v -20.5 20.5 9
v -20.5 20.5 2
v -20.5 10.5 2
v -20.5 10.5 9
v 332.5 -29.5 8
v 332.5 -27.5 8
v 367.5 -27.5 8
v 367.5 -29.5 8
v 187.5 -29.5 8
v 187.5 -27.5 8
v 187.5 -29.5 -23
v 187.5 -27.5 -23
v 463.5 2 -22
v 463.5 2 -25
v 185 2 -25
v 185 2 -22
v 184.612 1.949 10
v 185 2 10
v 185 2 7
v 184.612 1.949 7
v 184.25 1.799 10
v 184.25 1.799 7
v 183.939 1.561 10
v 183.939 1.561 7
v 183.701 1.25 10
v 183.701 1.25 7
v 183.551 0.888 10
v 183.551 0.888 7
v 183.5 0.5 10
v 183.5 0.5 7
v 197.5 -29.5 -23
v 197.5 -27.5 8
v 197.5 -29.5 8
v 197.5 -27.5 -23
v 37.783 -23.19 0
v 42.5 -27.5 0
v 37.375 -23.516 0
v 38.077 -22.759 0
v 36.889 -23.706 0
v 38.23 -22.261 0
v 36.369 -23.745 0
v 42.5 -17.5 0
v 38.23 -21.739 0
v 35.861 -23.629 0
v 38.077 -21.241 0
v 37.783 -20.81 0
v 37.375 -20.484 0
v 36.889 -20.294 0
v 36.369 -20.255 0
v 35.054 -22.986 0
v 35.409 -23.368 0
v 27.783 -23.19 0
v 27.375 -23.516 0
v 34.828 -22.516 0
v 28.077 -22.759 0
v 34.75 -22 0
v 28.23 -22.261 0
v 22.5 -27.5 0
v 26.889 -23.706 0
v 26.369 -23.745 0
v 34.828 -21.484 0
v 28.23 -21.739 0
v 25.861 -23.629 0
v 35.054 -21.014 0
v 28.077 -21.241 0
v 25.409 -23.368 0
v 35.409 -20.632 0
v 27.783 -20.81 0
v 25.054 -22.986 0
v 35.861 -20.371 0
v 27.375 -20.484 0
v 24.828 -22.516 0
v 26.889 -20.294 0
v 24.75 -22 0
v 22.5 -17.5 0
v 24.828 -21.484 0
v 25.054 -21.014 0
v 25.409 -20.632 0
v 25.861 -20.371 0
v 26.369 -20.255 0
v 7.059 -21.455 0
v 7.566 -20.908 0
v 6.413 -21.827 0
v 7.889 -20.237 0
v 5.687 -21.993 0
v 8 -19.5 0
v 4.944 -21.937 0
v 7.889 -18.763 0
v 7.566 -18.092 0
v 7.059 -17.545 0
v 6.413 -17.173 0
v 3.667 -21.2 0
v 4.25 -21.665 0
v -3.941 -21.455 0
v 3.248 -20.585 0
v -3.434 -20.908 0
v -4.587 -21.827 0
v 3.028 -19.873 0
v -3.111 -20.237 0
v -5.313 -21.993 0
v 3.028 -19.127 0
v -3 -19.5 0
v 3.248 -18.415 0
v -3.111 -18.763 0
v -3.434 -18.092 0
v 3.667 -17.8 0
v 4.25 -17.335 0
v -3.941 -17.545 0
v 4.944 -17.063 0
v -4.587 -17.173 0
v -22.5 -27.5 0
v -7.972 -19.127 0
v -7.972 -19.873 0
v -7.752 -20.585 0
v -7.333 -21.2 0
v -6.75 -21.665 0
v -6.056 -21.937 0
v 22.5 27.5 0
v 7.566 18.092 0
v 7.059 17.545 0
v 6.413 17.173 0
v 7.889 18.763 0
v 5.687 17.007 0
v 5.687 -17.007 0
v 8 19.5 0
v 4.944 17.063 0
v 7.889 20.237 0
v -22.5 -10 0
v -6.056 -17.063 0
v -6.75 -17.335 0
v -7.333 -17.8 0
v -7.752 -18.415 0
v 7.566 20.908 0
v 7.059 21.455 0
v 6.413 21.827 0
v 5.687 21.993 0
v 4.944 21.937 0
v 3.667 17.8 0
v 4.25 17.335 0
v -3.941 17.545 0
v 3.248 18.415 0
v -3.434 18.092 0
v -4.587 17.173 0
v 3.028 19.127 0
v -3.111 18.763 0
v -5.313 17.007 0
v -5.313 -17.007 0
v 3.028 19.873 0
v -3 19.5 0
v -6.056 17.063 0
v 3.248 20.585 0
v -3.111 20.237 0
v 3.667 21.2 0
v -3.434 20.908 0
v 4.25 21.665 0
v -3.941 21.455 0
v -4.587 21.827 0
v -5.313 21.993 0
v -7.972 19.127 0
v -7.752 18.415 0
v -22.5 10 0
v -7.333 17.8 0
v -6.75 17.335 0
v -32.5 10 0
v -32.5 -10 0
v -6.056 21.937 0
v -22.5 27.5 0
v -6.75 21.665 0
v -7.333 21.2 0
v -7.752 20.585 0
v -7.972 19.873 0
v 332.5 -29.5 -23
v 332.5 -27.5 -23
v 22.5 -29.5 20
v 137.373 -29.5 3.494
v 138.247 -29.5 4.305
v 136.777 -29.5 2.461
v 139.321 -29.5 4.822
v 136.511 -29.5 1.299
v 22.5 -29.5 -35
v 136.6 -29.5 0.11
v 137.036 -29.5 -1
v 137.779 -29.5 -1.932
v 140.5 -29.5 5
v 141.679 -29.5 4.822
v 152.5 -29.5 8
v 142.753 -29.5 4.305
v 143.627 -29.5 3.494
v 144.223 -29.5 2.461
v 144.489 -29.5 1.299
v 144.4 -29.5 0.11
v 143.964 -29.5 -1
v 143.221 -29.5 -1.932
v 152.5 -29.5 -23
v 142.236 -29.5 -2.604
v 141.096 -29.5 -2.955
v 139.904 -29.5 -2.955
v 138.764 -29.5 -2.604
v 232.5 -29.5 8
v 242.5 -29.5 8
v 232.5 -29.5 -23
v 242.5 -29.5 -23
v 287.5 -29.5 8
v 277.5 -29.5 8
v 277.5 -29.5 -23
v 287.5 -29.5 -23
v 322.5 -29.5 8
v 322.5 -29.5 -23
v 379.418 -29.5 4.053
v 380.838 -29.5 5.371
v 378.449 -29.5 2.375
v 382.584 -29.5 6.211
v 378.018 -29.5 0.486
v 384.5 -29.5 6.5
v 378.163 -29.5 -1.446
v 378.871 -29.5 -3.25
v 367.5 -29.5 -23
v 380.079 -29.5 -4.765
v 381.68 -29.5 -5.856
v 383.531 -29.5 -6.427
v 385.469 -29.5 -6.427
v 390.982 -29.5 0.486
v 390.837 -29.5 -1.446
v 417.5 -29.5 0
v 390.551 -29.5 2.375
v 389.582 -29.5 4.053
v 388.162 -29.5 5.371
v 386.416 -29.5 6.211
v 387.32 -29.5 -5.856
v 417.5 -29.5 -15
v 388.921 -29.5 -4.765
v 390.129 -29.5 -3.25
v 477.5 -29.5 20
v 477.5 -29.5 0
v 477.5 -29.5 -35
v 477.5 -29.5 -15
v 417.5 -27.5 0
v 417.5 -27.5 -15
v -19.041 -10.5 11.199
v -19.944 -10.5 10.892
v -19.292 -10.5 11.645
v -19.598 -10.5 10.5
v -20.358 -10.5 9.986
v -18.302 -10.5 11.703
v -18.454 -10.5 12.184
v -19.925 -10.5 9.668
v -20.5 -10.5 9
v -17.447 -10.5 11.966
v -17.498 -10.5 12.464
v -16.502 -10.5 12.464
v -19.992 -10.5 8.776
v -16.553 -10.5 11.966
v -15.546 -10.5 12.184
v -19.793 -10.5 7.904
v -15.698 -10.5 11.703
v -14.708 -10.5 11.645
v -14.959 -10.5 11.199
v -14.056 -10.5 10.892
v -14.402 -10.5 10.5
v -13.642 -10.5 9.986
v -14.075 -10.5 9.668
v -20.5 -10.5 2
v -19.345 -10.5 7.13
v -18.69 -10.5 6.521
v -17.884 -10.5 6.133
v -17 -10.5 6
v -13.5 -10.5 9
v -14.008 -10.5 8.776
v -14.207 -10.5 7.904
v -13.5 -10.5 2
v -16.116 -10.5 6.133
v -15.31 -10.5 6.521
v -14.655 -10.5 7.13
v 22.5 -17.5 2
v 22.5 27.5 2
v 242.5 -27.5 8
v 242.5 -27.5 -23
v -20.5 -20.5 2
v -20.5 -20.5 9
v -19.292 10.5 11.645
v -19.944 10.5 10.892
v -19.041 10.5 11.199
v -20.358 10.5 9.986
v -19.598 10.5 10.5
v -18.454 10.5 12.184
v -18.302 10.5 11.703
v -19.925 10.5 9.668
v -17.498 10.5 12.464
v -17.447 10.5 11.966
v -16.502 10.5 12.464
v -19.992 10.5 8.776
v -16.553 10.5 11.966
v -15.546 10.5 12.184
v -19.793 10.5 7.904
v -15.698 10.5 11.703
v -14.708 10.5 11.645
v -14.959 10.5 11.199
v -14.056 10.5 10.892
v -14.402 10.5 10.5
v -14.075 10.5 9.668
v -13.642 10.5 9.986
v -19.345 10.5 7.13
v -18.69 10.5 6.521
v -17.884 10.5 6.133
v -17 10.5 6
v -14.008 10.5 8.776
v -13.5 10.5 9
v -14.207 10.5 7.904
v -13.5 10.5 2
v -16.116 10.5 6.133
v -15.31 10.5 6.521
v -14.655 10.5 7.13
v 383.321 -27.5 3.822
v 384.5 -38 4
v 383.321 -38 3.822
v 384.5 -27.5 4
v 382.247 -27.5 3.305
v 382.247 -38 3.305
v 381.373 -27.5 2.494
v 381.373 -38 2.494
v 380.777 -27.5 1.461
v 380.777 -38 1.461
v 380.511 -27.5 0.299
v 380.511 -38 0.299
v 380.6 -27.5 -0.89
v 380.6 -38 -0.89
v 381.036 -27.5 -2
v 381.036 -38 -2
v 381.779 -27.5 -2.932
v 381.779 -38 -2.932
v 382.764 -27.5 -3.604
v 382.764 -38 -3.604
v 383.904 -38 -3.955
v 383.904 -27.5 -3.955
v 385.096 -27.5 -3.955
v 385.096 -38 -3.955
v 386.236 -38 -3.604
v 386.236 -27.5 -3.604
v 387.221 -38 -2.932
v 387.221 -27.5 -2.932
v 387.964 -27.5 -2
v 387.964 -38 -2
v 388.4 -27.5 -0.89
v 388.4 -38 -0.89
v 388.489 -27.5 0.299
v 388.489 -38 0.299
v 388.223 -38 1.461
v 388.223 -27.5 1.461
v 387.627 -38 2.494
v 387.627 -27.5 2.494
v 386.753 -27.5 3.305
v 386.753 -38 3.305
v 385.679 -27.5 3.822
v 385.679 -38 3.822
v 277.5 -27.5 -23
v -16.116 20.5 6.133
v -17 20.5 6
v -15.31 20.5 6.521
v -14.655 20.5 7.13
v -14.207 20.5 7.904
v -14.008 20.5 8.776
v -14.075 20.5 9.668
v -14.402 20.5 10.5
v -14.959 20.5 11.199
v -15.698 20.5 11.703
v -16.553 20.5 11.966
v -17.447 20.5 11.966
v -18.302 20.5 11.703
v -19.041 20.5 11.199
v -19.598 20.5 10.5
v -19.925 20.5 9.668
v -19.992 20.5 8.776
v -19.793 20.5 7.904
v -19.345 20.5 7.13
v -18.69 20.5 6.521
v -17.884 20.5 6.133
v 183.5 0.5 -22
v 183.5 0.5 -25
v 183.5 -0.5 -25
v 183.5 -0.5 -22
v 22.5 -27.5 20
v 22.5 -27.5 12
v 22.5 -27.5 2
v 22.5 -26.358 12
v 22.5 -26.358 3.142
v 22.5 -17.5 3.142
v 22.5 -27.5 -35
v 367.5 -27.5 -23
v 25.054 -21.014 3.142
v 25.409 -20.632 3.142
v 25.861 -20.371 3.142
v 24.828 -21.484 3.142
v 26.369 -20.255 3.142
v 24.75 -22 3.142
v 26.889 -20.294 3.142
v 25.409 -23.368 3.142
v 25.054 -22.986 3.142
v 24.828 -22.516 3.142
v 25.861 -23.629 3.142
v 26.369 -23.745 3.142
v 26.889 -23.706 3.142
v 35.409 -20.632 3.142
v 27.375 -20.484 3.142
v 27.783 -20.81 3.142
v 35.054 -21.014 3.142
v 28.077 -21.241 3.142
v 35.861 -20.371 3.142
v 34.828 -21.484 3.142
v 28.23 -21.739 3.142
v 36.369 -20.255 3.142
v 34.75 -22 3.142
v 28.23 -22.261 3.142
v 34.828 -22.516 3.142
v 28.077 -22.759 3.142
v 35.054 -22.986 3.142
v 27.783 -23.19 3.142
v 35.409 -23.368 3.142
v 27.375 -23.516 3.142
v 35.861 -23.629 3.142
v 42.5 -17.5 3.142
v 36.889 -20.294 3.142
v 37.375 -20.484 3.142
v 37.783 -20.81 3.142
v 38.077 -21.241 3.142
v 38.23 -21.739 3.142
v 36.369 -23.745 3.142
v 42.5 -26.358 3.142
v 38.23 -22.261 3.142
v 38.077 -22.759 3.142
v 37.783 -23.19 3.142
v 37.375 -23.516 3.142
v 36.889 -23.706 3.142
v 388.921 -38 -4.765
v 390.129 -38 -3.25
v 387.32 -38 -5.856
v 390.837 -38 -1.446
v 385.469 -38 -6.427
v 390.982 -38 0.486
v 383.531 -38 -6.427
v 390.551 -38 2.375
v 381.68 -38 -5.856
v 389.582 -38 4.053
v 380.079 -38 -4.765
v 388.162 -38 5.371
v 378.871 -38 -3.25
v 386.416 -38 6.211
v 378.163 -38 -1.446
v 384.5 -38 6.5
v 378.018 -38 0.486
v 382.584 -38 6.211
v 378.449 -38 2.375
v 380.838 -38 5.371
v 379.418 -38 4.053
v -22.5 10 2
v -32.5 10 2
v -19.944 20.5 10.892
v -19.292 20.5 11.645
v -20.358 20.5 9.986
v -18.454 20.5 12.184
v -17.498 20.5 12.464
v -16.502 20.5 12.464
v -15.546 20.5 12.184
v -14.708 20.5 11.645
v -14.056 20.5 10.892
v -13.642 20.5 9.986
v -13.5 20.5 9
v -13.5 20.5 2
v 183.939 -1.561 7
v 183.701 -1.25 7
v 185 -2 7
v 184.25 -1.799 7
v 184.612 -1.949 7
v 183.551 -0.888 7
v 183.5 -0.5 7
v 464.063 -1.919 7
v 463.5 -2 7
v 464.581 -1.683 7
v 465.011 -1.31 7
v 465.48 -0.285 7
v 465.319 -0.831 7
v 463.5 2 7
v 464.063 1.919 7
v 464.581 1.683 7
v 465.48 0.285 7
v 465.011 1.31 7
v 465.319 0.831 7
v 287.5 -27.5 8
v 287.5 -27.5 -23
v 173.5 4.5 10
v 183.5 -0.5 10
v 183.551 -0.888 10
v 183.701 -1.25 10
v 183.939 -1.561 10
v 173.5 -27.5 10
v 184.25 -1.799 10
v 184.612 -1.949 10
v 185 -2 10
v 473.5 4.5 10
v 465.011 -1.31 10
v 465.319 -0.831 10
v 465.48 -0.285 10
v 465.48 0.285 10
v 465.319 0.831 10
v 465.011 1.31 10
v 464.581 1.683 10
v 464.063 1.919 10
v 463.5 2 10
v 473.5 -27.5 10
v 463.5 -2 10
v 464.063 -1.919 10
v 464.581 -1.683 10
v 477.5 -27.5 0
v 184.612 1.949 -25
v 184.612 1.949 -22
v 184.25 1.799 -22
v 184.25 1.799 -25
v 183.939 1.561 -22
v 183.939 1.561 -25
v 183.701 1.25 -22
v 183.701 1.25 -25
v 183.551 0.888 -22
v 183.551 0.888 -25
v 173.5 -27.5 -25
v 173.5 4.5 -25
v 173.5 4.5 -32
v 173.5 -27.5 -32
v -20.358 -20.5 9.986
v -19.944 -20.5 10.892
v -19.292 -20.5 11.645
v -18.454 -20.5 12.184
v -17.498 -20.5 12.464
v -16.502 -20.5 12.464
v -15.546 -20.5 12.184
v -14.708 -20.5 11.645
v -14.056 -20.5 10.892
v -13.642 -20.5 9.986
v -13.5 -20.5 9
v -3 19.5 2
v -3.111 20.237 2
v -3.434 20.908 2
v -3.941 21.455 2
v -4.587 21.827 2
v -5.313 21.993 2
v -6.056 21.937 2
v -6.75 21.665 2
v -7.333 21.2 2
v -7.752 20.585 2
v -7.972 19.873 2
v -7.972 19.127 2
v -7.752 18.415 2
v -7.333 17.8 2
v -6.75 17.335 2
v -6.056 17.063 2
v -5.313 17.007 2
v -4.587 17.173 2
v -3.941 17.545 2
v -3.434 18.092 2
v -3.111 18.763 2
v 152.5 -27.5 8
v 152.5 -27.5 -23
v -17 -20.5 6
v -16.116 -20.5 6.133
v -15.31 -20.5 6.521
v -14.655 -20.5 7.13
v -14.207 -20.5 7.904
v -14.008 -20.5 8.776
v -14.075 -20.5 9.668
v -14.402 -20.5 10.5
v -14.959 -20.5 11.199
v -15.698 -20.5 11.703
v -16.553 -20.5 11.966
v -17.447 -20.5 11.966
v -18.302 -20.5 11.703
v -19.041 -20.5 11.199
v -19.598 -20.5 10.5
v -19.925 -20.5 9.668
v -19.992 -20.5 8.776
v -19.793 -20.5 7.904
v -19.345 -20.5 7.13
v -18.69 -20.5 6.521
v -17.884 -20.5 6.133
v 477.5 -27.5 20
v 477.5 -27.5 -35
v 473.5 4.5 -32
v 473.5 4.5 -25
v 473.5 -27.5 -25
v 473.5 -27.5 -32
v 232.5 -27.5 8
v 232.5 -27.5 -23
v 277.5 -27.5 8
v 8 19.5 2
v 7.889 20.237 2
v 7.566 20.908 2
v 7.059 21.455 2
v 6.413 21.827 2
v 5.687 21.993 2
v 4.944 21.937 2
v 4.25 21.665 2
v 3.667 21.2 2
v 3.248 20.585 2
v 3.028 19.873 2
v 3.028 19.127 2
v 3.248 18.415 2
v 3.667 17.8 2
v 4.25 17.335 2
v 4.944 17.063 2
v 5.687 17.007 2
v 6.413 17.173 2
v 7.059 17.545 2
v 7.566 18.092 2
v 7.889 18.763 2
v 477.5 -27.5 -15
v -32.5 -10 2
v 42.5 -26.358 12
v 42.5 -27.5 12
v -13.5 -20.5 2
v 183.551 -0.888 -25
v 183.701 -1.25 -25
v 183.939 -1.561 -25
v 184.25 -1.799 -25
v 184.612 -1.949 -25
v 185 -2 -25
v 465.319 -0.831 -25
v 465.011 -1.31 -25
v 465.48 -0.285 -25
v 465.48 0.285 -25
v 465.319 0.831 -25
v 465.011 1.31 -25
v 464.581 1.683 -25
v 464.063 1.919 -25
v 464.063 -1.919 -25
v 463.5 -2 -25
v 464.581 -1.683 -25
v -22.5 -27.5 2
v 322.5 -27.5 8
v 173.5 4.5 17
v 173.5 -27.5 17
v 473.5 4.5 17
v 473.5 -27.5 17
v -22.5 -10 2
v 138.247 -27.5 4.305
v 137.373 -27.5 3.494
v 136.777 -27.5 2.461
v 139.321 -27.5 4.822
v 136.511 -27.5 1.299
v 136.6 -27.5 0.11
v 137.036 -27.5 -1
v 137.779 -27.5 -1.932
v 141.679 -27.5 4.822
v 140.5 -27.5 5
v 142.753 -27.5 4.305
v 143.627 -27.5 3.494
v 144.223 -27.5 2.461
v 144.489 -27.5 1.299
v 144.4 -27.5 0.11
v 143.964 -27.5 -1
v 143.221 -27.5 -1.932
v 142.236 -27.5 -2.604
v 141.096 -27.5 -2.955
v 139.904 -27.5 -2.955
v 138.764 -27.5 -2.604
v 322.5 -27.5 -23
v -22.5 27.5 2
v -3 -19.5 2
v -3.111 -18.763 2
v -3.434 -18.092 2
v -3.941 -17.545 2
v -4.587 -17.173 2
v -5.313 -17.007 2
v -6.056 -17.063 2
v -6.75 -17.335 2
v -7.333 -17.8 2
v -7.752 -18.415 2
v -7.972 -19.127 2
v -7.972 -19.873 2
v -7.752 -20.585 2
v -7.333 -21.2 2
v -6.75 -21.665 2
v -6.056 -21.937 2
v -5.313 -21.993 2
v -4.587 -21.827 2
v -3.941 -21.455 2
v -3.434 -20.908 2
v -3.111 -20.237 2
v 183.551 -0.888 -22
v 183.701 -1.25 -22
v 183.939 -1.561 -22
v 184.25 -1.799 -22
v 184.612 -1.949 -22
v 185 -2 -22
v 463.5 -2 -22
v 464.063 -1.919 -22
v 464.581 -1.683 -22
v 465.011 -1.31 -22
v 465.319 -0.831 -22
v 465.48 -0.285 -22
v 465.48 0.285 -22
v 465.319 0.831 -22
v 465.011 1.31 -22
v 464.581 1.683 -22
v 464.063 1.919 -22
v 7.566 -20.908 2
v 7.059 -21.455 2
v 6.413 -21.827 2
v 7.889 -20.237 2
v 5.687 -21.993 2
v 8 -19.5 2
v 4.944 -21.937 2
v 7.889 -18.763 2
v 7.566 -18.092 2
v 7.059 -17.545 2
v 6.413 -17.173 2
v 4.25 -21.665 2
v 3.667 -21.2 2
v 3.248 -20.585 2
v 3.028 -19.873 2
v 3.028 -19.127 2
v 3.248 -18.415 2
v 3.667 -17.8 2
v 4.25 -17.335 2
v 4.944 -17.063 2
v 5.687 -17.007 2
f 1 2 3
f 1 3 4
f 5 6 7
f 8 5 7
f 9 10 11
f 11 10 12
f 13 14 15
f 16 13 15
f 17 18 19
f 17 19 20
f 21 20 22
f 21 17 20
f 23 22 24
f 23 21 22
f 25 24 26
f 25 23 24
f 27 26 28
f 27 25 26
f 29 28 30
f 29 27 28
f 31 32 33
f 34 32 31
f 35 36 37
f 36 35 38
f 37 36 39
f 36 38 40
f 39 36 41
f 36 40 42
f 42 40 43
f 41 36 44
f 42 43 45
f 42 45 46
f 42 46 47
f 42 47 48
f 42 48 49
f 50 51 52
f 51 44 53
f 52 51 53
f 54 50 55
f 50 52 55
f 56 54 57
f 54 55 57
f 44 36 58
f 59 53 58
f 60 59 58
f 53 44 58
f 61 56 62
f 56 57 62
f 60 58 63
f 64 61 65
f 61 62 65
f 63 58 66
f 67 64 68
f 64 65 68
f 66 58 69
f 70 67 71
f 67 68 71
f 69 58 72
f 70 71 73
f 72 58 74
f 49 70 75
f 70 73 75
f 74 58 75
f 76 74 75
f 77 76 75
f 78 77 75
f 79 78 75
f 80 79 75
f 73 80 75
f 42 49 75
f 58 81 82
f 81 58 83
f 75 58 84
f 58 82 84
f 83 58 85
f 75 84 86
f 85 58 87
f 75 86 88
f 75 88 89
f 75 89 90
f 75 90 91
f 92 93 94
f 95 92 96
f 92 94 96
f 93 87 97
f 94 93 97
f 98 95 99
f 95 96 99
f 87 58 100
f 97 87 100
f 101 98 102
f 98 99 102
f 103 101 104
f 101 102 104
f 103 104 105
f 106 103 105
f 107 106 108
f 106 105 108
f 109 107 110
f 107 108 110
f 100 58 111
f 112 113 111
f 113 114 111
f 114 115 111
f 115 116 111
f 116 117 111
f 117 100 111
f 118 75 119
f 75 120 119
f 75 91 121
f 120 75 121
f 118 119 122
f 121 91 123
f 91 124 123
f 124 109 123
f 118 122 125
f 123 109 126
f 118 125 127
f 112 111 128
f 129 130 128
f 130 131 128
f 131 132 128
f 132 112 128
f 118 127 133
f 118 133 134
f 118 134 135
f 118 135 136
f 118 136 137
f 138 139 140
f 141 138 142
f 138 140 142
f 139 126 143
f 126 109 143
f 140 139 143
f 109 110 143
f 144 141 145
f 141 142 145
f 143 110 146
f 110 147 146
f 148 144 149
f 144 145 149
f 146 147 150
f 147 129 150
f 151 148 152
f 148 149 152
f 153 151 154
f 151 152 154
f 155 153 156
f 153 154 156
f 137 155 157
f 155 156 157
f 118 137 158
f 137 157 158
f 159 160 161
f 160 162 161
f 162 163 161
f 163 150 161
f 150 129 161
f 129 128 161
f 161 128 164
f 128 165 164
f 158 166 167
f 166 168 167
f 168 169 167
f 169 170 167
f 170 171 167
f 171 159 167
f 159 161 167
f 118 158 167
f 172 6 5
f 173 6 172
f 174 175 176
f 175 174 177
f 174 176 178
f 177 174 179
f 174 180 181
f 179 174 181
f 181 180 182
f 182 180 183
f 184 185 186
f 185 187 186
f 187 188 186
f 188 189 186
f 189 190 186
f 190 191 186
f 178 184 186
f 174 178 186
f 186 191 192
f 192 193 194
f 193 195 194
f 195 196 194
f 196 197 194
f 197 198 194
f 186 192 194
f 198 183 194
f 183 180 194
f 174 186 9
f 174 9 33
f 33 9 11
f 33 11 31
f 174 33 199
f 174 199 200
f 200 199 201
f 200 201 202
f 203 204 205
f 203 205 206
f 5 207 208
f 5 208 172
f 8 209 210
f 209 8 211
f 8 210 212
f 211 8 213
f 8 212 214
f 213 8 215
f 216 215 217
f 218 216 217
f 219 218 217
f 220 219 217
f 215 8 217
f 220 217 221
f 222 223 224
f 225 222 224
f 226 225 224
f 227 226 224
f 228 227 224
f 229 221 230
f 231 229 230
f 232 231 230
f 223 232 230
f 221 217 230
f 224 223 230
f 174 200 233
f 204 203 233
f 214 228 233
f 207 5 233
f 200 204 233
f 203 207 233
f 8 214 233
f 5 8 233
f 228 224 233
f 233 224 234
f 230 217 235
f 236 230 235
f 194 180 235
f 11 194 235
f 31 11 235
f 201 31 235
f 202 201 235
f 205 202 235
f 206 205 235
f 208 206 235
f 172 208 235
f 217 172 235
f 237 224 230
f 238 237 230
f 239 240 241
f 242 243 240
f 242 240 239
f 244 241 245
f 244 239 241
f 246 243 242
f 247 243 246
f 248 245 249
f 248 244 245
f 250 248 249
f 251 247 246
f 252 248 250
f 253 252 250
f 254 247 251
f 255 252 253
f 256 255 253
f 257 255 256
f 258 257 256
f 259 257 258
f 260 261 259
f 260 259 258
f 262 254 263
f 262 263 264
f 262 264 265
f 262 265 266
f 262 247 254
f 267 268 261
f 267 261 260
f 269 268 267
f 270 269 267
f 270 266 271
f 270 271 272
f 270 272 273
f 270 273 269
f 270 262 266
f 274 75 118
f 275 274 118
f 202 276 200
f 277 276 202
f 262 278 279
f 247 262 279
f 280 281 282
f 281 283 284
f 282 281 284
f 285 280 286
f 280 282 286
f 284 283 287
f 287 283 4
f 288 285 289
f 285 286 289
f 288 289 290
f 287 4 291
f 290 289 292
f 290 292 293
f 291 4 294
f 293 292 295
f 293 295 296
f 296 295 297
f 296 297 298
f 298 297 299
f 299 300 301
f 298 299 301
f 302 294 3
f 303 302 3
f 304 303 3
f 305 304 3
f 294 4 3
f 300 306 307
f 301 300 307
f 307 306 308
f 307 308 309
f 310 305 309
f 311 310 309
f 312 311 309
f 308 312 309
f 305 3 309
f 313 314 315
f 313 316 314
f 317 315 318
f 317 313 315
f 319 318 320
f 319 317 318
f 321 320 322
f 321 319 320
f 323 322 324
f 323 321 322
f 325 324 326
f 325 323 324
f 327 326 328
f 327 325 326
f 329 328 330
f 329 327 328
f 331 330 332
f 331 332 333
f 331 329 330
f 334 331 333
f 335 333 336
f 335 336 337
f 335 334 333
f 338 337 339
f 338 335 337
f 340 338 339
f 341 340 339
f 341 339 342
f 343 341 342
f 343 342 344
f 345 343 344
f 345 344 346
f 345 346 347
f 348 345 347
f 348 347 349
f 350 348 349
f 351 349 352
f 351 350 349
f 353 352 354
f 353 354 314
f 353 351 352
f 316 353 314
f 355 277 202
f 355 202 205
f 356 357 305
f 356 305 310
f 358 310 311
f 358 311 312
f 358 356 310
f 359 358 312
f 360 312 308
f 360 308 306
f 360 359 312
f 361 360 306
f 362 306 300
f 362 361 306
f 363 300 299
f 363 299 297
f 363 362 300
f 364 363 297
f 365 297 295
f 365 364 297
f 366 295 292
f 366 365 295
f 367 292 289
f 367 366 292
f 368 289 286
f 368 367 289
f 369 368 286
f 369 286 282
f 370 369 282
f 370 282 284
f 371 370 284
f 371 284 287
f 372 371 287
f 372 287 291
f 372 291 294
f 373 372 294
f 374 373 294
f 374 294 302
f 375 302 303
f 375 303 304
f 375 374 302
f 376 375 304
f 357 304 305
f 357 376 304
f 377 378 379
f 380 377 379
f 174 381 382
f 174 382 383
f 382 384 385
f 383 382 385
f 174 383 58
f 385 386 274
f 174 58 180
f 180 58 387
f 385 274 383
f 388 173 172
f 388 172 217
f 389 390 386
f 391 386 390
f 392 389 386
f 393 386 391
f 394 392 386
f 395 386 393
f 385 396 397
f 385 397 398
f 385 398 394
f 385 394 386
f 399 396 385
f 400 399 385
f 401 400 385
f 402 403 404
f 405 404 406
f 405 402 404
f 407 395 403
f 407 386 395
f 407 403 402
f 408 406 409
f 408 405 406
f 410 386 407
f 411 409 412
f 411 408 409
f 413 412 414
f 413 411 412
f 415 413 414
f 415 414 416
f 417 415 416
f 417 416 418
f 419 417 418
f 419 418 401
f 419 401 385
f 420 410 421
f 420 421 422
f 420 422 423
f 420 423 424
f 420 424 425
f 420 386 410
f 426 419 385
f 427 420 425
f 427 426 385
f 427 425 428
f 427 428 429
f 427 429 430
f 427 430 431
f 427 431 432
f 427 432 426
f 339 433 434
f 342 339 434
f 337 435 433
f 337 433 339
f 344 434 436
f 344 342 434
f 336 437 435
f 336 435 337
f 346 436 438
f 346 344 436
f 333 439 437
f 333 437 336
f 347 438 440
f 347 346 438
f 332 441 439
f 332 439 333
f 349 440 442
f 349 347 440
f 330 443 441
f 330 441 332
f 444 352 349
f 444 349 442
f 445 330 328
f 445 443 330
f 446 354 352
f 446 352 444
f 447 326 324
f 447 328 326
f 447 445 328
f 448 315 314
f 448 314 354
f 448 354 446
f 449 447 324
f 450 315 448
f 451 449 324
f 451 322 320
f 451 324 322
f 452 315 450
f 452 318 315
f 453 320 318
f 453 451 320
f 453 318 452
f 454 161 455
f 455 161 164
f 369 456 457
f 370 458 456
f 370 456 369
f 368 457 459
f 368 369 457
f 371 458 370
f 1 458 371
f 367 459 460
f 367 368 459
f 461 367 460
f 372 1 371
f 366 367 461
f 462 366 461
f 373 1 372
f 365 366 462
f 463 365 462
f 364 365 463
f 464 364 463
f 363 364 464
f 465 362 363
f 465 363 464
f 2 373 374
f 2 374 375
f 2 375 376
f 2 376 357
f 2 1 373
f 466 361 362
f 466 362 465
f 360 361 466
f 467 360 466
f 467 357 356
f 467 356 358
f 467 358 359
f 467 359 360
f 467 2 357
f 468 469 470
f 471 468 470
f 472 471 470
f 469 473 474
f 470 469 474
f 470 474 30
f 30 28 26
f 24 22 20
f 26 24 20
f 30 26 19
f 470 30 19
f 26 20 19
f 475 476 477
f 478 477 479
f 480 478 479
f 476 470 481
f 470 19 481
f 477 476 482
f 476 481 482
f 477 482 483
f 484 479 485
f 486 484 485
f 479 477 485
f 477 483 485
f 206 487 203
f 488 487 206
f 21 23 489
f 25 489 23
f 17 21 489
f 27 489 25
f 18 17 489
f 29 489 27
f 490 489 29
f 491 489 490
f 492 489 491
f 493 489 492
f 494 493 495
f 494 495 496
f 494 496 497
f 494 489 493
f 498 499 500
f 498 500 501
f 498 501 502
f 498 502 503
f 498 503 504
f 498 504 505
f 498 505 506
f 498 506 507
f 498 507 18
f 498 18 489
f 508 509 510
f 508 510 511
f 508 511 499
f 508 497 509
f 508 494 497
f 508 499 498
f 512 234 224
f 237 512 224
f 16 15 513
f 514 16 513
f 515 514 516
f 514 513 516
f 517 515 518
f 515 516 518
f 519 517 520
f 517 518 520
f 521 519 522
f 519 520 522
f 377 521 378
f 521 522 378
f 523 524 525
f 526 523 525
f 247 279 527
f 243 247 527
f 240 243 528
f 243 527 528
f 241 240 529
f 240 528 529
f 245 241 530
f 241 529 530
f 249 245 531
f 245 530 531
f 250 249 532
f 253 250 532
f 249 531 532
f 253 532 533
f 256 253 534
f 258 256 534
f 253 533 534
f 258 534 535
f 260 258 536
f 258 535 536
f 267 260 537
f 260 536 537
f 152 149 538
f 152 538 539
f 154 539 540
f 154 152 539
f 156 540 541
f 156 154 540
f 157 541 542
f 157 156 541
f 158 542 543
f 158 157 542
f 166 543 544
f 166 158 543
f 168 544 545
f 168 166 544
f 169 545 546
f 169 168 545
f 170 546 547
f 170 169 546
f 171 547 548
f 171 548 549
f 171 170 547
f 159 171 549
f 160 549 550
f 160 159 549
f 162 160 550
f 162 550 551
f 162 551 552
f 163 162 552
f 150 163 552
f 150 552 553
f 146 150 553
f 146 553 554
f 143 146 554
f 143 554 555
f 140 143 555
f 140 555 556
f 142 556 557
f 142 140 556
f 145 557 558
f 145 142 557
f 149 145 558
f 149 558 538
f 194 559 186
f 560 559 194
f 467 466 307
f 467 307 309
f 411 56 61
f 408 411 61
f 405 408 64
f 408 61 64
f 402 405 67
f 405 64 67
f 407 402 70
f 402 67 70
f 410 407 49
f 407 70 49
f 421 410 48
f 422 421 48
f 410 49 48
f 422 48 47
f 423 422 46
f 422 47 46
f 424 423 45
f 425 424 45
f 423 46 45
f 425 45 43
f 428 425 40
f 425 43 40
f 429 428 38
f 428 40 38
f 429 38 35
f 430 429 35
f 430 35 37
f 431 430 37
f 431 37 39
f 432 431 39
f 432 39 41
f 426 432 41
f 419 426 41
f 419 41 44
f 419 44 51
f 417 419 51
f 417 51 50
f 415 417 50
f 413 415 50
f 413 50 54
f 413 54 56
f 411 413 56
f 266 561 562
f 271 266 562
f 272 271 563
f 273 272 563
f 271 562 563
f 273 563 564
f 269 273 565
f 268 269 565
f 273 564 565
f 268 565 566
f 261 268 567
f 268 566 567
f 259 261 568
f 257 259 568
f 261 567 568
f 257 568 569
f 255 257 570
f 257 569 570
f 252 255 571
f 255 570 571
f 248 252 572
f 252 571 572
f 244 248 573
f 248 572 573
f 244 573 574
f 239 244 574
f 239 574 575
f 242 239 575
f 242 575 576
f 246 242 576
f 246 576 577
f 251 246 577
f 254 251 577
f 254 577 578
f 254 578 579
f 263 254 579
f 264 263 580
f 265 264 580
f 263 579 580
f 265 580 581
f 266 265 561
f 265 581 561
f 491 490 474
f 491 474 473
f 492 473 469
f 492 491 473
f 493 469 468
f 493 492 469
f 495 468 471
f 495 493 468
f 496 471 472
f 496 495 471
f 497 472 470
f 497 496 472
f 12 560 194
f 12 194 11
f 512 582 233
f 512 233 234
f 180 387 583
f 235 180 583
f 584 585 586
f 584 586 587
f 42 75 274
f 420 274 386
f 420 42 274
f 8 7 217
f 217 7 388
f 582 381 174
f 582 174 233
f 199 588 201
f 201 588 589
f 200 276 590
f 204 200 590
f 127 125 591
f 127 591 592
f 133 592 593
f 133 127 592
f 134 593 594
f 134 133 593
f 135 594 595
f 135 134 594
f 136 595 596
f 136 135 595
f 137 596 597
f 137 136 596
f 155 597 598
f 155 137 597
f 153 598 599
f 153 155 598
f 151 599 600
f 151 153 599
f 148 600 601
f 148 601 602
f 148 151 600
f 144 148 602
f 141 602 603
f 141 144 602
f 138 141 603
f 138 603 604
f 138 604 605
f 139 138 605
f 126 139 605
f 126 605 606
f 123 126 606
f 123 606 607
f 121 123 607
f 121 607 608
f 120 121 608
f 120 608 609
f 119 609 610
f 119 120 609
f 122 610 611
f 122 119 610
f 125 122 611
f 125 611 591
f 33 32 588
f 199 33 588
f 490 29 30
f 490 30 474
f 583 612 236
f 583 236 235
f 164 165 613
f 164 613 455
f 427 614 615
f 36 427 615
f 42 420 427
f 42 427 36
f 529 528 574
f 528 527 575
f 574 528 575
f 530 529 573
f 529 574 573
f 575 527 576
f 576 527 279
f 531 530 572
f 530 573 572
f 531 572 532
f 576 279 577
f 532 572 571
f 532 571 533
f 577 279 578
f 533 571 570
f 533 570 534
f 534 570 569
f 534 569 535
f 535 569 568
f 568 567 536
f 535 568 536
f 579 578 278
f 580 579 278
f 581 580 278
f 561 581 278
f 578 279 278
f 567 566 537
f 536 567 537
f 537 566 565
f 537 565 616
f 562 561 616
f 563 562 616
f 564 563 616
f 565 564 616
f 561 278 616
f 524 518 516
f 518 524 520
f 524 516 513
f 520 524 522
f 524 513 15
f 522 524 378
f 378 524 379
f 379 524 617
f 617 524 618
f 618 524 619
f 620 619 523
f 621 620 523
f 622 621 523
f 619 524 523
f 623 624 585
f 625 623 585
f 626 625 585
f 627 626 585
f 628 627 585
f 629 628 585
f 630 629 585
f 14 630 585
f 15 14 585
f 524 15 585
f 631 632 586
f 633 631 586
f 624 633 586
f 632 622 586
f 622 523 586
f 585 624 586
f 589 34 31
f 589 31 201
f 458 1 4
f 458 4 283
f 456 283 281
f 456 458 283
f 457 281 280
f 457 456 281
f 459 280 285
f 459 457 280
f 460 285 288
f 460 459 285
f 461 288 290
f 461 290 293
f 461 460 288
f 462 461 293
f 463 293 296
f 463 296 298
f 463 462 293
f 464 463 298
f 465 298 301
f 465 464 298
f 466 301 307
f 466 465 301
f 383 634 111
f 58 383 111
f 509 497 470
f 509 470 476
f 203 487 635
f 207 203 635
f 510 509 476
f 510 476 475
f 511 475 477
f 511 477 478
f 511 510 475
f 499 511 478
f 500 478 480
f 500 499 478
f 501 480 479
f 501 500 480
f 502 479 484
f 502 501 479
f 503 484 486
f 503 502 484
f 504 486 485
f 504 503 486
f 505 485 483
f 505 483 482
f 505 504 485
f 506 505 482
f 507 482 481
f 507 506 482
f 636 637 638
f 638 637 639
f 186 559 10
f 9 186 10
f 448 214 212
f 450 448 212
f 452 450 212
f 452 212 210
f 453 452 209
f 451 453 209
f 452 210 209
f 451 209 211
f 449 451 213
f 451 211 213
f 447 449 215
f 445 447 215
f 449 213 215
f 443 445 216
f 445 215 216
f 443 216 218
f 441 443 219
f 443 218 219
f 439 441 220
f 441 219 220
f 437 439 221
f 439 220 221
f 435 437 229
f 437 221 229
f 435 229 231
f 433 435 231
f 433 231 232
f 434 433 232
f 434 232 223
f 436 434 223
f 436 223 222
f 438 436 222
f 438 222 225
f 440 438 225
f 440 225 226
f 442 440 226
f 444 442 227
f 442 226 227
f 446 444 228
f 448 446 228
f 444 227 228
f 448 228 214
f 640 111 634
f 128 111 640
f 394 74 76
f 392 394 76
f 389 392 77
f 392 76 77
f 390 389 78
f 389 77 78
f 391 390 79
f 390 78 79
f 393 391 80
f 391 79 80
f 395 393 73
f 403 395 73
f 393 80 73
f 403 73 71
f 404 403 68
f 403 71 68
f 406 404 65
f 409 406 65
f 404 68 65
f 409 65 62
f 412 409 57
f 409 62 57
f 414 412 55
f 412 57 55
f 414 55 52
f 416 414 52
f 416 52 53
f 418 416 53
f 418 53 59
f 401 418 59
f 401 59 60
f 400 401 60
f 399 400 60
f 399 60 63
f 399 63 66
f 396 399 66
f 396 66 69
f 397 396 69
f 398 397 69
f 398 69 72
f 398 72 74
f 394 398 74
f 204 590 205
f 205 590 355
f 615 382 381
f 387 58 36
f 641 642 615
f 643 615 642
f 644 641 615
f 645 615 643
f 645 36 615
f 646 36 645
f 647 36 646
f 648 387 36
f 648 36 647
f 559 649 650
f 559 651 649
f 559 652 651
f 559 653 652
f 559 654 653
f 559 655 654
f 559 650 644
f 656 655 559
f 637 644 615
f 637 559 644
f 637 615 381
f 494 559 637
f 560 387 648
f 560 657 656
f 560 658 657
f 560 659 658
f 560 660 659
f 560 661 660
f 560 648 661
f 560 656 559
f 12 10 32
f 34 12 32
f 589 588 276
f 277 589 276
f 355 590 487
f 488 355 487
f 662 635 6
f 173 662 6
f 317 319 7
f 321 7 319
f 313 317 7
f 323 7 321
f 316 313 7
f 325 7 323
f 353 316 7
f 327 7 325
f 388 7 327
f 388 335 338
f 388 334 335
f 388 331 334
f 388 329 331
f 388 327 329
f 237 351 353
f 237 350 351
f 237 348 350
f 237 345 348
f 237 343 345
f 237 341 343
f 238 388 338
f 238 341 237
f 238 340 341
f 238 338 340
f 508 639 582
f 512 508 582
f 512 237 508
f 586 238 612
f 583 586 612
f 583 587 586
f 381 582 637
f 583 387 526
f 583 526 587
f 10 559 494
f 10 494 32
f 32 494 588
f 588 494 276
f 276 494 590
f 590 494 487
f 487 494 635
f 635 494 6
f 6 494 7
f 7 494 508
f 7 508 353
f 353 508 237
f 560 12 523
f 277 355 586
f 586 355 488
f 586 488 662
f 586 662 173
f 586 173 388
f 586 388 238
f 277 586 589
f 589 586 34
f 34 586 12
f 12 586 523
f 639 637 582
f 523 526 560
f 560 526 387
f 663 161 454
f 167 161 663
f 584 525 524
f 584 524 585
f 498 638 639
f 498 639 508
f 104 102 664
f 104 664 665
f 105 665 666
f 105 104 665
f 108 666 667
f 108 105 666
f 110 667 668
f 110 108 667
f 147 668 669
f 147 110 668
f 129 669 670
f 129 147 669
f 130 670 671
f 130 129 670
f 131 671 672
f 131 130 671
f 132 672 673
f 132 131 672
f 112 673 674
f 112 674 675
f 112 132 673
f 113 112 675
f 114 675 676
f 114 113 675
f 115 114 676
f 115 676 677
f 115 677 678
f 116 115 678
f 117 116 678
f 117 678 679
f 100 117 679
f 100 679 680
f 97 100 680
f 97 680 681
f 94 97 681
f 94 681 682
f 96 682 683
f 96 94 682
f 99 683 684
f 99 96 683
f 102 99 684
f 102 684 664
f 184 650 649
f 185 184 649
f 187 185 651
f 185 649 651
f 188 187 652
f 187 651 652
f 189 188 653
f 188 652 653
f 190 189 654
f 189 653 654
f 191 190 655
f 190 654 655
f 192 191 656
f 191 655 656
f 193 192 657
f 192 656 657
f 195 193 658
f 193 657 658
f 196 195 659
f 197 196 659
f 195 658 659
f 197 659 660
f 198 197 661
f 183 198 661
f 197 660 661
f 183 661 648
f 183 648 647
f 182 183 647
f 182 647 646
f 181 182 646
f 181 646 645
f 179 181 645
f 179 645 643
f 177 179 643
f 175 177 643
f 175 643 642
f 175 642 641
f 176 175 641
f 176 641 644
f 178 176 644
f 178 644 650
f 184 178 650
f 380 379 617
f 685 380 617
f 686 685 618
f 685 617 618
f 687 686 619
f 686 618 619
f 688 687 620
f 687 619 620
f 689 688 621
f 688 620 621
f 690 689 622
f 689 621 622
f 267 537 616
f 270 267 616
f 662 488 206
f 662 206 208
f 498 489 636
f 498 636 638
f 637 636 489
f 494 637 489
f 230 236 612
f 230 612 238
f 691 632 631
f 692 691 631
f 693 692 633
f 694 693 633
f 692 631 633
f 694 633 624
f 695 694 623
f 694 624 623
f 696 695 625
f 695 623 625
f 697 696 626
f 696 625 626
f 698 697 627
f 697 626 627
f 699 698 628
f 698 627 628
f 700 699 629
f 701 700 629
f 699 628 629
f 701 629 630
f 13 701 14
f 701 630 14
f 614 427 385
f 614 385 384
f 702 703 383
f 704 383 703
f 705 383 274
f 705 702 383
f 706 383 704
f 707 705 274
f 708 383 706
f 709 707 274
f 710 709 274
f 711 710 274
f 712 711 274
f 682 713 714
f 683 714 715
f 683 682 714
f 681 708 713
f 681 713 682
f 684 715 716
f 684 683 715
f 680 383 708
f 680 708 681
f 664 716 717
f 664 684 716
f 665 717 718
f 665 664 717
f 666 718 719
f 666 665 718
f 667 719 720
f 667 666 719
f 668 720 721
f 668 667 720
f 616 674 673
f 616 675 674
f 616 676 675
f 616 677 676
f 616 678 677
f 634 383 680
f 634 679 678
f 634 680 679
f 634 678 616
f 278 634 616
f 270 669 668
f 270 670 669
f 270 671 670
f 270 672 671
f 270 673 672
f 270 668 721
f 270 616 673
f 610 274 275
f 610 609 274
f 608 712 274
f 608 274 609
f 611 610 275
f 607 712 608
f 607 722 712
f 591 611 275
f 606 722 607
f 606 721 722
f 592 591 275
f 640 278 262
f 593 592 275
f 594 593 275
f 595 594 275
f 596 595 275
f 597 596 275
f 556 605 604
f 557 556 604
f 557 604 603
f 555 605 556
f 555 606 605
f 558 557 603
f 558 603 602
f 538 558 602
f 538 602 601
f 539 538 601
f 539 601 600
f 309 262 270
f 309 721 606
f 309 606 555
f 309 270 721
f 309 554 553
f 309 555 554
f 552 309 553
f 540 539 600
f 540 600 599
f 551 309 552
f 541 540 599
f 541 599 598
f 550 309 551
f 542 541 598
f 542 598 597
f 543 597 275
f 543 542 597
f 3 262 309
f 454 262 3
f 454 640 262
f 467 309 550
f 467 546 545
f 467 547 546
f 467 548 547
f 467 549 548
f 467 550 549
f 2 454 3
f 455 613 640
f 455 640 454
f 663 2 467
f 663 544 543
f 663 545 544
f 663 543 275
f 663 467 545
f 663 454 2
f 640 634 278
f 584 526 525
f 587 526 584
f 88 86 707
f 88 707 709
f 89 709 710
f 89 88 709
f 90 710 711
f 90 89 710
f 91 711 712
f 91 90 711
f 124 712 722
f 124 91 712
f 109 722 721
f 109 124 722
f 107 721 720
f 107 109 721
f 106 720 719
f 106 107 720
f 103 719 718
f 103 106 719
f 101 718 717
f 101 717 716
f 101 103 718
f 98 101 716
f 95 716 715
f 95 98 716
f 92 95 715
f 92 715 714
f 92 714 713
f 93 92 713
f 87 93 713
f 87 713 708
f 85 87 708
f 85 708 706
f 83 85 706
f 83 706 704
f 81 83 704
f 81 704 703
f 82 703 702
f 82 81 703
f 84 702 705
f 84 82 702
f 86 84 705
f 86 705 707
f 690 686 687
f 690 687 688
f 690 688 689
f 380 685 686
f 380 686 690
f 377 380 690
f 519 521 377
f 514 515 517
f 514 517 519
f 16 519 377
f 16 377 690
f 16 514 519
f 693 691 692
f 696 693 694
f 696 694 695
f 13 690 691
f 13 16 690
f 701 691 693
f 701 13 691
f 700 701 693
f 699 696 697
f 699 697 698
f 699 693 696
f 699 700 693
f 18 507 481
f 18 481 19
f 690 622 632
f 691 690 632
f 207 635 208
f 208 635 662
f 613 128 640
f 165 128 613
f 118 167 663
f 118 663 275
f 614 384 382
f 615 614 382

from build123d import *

# Parameters (mm, degrees)
CROQUIS1_W               = 45
CROQUIS1_H               = 55
CROQUIS1_R               = 2.5
SALIENTE_EXTRUIR1_DEPTH  = 2
CROQUIS2_W               = 10
CROQUIS2_H               = 20
SALIENTE_EXTRUIR2_DEPTH  = 2
CROQUIS4_R               = 3
SALIENTE_EXTRUIR4_DEPTH  = 10
CROQUIS6_W               = 2
CROQUIS6_H               = 10
SALIENTE_EXTRUIR6_DEPTH  = 20
CROQUIS7_W               = 455
CROQUIS7_H               = 55
SALIENTE_EXTRUIR7_DEPTH  = 2
CROQUIS8_W               = 60
CROQUIS8_H               = 15
CORTAR_EXTRUIR1_DEPTH    = 2
SALIENTE_EXTRUIR8_DEPTH  = 20
CROQUIS10_R              = 1.75
CORTAR_EXTRUIR2_DEPTH    = 480.688961724
CROQUIS11_W              = 300
CROQUIS11_H              = 7
SALIENTE_EXTRUIR9_DEPTH  = 32
SALIENTE_EXTRUIR10_DEPTH = 3
CROQUIS17_R              = 4
CORTAR_EXTRUIR4_DEPTH    = 10
CROQUIS18_W              = 35
CROQUIS18_H              = 31
CORTAR_EXTRUIR5_DEPTH    = 10
CROQUIS19_R              = 4
CORTAR_EXTRUIR6_DEPTH    = 10
CROQUIS22_R              = 6.5
CROQUIS22_R_2            = 4
SALIENTE_EXTRUIR11_DEPTH = 8.5


with BuildPart() as part:
    # Croquis1 → Saliente-Extruir1 (new body)
    with BuildSketch(Plane.XY):
        Rectangle(CROQUIS1_W, CROQUIS1_H)
        with Locations((5.5, 19.5)):
            Circle(CROQUIS1_R, mode=Mode.SUBTRACT)
        with Locations((-5.5, 19.5)):
            Circle(CROQUIS1_R, mode=Mode.SUBTRACT)
        with Locations((-5.5, -19.5)):
            Circle(CROQUIS1_R, mode=Mode.SUBTRACT)
        with Locations((5.5, -19.5)):
            Circle(CROQUIS1_R, mode=Mode.SUBTRACT)
    extrude(amount=SALIENTE_EXTRUIR1_DEPTH)

    # Croquis2 → Saliente-Extruir2 (add)
    with BuildSketch(Plane(origin=(0, 0, 0), x_dir=(-1, 0, 0), z_dir=(0, 0, -1))):
        with Locations((27.5, 0)):
            Rectangle(CROQUIS2_W, CROQUIS2_H)
    extrude(amount=-SALIENTE_EXTRUIR2_DEPTH)

    # Croquis4 → Saliente-Extruir4 (add)
    with BuildSketch(Plane(origin=(0, -20.5, 0), x_dir=(-1, 0, 0), z_dir=(0, -1, 0))):
        with BuildLine():
            Line((13.5, -2), (20.5, -2))
            Line((20.5, -2), (20.5, -9))
            ThreePointArc((20.5, -9), (17, -12.5), (13.5, -9))
            Line((13.5, -9), (13.5, -2))
        make_face()
        with Locations(Location((17, -9, 0), (0, 0, 90))):
            Circle(CROQUIS4_R, mode=Mode.SUBTRACT)
    saliente_extruir4 = extrude(amount=-SALIENTE_EXTRUIR4_DEPTH)

    # Simetría1: Saliente-Extruir4 across plane
    add(saliente_extruir4.mirror(Plane.ZX))

    # Croquis6 → Saliente-Extruir6 (add)
    with BuildSketch(Plane(origin=(22.5, 0, 0), x_dir=(0, 0, -1), z_dir=(1, 0, 0))):
        with Locations((-1, -22.5)):
            Rectangle(CROQUIS6_W, CROQUIS6_H)
    extrude(amount=SALIENTE_EXTRUIR6_DEPTH)

    # Croquis7 → Saliente-Extruir7 (add)
    with BuildSketch(Plane(origin=(0, -27.5, 0), x_dir=(1, 0, 0), z_dir=(0, 1, 0))):
        with Locations((250, 7.5)):
            Rectangle(CROQUIS7_W, CROQUIS7_H)
    extrude(amount=-SALIENTE_EXTRUIR7_DEPTH)

    # Croquis8 → Cortar-Extruir1 (cut)
    with BuildSketch(Plane(origin=(0, -29.5, 0), x_dir=(-1, 0, 0), z_dir=(0, -1, 0))):
        with Locations((-447.5, 7.5)):
            Rectangle(CROQUIS8_W, CROQUIS8_H)
    extrude(amount=-CORTAR_EXTRUIR1_DEPTH, mode=Mode.SUBTRACT)

    # Croquis9 → Saliente-Extruir8 (add)
    with BuildSketch(Plane(origin=(42.5, 0, 0), x_dir=(0, 0, -1), z_dir=(1, 0, 0))):
        Polygon((-2, -26.357753354), (-2, -17.5), (-3.142246646, -17.5), (-3.142246646, -26.357753354), (-12, -26.357753354), (-12, -27.5), (-2, -27.5), align=None)
    extrude(amount=-SALIENTE_EXTRUIR8_DEPTH)

    # Croquis10 → Cortar-Extruir2 (cut, through all)
    with BuildSketch(Plane(origin=(0, 0, 0), x_dir=(-1, 0, 0), z_dir=(0, 0, -1))):
        with Locations((-26.5, -22)):
            Circle(CROQUIS10_R)
        with Locations((-36.5, -22)):
            Circle(CROQUIS10_R)
    extrude(amount=-CORTAR_EXTRUIR2_DEPTH, mode=Mode.SUBTRACT)

    # Croquis11 → Saliente-Extruir9 (add)
    with BuildSketch(Plane(origin=(0, -27.5, 0), x_dir=(1, 0, 0), z_dir=(0, 1, 0))):
        with Locations((323.5, 28.5)):
            Rectangle(CROQUIS11_W, CROQUIS11_H)
        with Locations((323.5, -13.5)):
            Rectangle(CROQUIS11_W, CROQUIS11_H)
    extrude(amount=SALIENTE_EXTRUIR9_DEPTH)

    # Croquis13 → Saliente-Extruir10 (add)
    with BuildSketch(Plane(origin=(0, 0, 10), x_dir=(-1, 0, 0), z_dir=(0, 0, -1))):
        with BuildLine():
            Line((-463.5, 2), (-185, 2))
            ThreePointArc((-185, 2), (-183.939339828, 1.560660172), (-183.5, 0.5))
            Line((-183.5, 0.5), (-183.5, -0.5))
            ThreePointArc((-183.5, -0.5), (-183.939339828, -1.560660172), (-185, -2))
            Line((-185, -2), (-463.5, -2))
            ThreePointArc((-463.5, -2), (-465.5, 0), (-463.5, 2))
        make_face()
    saliente_extruir10 = extrude(amount=SALIENTE_EXTRUIR10_DEPTH)

    # Simetría2: Saliente-Extruir10 across plane
    add(saliente_extruir10.mirror(Plane(origin=(0, 0, -7.5), x_dir=(1, 0, 0), z_dir=(0, 0, -1))))

    # Croquis17 → Cortar-Extruir4 (cut)
    with BuildSketch(Plane(origin=(0, -27.5, 0), x_dir=(1, 0, 0), z_dir=(0, 1, 0))):
        with Locations(Location((140.5, -1, 0), (0, 0, 270))):
            Circle(CROQUIS17_R)
    extrude(amount=-CORTAR_EXTRUIR4_DEPTH, mode=Mode.SUBTRACT)

    # Croquis18 → Cortar-Extruir5 (cut)
    with BuildSketch(Plane(origin=(0, -27.5, 0), x_dir=(1, 0, 0), z_dir=(0, 1, 0))):
        with Locations((170, 7.5)):
            Rectangle(CROQUIS18_W, CROQUIS18_H)
        with Locations((215, 7.5)):
            Rectangle(CROQUIS18_W, CROQUIS18_H)
        with Locations((260, 7.5)):
            Rectangle(CROQUIS18_W, CROQUIS18_H)
        with Locations((305, 7.5)):
            Rectangle(CROQUIS18_W, CROQUIS18_H)
        with Locations((350, 7.5)):
            Rectangle(CROQUIS18_W, CROQUIS18_H)
    extrude(amount=-CORTAR_EXTRUIR5_DEPTH, mode=Mode.SUBTRACT)

    # Croquis19 → Cortar-Extruir6 (cut)
    with BuildSketch(Plane(origin=(0, -27.5, 0), x_dir=(1, 0, 0), z_dir=(0, 1, 0))):
        with Locations(Location((384.5, 0, 0), (0, 0, 270))):
            Circle(CROQUIS19_R)
    extrude(amount=-CORTAR_EXTRUIR6_DEPTH, mode=Mode.SUBTRACT)

    # Croquis22 → Saliente-Extruir11 (add)
    with BuildSketch(Plane.XZ.offset(29.5)):
        with Locations(Location((384.5, 0, 0), (0, 0, 90))):
            Circle(CROQUIS22_R)
        with Locations(Location((384.5, 0, 0), (0, 0, 90))):
            Circle(CROQUIS22_R_2, mode=Mode.SUBTRACT)
    extrude(amount=SALIENTE_EXTRUIR11_DEPTH)


solid = part.part
